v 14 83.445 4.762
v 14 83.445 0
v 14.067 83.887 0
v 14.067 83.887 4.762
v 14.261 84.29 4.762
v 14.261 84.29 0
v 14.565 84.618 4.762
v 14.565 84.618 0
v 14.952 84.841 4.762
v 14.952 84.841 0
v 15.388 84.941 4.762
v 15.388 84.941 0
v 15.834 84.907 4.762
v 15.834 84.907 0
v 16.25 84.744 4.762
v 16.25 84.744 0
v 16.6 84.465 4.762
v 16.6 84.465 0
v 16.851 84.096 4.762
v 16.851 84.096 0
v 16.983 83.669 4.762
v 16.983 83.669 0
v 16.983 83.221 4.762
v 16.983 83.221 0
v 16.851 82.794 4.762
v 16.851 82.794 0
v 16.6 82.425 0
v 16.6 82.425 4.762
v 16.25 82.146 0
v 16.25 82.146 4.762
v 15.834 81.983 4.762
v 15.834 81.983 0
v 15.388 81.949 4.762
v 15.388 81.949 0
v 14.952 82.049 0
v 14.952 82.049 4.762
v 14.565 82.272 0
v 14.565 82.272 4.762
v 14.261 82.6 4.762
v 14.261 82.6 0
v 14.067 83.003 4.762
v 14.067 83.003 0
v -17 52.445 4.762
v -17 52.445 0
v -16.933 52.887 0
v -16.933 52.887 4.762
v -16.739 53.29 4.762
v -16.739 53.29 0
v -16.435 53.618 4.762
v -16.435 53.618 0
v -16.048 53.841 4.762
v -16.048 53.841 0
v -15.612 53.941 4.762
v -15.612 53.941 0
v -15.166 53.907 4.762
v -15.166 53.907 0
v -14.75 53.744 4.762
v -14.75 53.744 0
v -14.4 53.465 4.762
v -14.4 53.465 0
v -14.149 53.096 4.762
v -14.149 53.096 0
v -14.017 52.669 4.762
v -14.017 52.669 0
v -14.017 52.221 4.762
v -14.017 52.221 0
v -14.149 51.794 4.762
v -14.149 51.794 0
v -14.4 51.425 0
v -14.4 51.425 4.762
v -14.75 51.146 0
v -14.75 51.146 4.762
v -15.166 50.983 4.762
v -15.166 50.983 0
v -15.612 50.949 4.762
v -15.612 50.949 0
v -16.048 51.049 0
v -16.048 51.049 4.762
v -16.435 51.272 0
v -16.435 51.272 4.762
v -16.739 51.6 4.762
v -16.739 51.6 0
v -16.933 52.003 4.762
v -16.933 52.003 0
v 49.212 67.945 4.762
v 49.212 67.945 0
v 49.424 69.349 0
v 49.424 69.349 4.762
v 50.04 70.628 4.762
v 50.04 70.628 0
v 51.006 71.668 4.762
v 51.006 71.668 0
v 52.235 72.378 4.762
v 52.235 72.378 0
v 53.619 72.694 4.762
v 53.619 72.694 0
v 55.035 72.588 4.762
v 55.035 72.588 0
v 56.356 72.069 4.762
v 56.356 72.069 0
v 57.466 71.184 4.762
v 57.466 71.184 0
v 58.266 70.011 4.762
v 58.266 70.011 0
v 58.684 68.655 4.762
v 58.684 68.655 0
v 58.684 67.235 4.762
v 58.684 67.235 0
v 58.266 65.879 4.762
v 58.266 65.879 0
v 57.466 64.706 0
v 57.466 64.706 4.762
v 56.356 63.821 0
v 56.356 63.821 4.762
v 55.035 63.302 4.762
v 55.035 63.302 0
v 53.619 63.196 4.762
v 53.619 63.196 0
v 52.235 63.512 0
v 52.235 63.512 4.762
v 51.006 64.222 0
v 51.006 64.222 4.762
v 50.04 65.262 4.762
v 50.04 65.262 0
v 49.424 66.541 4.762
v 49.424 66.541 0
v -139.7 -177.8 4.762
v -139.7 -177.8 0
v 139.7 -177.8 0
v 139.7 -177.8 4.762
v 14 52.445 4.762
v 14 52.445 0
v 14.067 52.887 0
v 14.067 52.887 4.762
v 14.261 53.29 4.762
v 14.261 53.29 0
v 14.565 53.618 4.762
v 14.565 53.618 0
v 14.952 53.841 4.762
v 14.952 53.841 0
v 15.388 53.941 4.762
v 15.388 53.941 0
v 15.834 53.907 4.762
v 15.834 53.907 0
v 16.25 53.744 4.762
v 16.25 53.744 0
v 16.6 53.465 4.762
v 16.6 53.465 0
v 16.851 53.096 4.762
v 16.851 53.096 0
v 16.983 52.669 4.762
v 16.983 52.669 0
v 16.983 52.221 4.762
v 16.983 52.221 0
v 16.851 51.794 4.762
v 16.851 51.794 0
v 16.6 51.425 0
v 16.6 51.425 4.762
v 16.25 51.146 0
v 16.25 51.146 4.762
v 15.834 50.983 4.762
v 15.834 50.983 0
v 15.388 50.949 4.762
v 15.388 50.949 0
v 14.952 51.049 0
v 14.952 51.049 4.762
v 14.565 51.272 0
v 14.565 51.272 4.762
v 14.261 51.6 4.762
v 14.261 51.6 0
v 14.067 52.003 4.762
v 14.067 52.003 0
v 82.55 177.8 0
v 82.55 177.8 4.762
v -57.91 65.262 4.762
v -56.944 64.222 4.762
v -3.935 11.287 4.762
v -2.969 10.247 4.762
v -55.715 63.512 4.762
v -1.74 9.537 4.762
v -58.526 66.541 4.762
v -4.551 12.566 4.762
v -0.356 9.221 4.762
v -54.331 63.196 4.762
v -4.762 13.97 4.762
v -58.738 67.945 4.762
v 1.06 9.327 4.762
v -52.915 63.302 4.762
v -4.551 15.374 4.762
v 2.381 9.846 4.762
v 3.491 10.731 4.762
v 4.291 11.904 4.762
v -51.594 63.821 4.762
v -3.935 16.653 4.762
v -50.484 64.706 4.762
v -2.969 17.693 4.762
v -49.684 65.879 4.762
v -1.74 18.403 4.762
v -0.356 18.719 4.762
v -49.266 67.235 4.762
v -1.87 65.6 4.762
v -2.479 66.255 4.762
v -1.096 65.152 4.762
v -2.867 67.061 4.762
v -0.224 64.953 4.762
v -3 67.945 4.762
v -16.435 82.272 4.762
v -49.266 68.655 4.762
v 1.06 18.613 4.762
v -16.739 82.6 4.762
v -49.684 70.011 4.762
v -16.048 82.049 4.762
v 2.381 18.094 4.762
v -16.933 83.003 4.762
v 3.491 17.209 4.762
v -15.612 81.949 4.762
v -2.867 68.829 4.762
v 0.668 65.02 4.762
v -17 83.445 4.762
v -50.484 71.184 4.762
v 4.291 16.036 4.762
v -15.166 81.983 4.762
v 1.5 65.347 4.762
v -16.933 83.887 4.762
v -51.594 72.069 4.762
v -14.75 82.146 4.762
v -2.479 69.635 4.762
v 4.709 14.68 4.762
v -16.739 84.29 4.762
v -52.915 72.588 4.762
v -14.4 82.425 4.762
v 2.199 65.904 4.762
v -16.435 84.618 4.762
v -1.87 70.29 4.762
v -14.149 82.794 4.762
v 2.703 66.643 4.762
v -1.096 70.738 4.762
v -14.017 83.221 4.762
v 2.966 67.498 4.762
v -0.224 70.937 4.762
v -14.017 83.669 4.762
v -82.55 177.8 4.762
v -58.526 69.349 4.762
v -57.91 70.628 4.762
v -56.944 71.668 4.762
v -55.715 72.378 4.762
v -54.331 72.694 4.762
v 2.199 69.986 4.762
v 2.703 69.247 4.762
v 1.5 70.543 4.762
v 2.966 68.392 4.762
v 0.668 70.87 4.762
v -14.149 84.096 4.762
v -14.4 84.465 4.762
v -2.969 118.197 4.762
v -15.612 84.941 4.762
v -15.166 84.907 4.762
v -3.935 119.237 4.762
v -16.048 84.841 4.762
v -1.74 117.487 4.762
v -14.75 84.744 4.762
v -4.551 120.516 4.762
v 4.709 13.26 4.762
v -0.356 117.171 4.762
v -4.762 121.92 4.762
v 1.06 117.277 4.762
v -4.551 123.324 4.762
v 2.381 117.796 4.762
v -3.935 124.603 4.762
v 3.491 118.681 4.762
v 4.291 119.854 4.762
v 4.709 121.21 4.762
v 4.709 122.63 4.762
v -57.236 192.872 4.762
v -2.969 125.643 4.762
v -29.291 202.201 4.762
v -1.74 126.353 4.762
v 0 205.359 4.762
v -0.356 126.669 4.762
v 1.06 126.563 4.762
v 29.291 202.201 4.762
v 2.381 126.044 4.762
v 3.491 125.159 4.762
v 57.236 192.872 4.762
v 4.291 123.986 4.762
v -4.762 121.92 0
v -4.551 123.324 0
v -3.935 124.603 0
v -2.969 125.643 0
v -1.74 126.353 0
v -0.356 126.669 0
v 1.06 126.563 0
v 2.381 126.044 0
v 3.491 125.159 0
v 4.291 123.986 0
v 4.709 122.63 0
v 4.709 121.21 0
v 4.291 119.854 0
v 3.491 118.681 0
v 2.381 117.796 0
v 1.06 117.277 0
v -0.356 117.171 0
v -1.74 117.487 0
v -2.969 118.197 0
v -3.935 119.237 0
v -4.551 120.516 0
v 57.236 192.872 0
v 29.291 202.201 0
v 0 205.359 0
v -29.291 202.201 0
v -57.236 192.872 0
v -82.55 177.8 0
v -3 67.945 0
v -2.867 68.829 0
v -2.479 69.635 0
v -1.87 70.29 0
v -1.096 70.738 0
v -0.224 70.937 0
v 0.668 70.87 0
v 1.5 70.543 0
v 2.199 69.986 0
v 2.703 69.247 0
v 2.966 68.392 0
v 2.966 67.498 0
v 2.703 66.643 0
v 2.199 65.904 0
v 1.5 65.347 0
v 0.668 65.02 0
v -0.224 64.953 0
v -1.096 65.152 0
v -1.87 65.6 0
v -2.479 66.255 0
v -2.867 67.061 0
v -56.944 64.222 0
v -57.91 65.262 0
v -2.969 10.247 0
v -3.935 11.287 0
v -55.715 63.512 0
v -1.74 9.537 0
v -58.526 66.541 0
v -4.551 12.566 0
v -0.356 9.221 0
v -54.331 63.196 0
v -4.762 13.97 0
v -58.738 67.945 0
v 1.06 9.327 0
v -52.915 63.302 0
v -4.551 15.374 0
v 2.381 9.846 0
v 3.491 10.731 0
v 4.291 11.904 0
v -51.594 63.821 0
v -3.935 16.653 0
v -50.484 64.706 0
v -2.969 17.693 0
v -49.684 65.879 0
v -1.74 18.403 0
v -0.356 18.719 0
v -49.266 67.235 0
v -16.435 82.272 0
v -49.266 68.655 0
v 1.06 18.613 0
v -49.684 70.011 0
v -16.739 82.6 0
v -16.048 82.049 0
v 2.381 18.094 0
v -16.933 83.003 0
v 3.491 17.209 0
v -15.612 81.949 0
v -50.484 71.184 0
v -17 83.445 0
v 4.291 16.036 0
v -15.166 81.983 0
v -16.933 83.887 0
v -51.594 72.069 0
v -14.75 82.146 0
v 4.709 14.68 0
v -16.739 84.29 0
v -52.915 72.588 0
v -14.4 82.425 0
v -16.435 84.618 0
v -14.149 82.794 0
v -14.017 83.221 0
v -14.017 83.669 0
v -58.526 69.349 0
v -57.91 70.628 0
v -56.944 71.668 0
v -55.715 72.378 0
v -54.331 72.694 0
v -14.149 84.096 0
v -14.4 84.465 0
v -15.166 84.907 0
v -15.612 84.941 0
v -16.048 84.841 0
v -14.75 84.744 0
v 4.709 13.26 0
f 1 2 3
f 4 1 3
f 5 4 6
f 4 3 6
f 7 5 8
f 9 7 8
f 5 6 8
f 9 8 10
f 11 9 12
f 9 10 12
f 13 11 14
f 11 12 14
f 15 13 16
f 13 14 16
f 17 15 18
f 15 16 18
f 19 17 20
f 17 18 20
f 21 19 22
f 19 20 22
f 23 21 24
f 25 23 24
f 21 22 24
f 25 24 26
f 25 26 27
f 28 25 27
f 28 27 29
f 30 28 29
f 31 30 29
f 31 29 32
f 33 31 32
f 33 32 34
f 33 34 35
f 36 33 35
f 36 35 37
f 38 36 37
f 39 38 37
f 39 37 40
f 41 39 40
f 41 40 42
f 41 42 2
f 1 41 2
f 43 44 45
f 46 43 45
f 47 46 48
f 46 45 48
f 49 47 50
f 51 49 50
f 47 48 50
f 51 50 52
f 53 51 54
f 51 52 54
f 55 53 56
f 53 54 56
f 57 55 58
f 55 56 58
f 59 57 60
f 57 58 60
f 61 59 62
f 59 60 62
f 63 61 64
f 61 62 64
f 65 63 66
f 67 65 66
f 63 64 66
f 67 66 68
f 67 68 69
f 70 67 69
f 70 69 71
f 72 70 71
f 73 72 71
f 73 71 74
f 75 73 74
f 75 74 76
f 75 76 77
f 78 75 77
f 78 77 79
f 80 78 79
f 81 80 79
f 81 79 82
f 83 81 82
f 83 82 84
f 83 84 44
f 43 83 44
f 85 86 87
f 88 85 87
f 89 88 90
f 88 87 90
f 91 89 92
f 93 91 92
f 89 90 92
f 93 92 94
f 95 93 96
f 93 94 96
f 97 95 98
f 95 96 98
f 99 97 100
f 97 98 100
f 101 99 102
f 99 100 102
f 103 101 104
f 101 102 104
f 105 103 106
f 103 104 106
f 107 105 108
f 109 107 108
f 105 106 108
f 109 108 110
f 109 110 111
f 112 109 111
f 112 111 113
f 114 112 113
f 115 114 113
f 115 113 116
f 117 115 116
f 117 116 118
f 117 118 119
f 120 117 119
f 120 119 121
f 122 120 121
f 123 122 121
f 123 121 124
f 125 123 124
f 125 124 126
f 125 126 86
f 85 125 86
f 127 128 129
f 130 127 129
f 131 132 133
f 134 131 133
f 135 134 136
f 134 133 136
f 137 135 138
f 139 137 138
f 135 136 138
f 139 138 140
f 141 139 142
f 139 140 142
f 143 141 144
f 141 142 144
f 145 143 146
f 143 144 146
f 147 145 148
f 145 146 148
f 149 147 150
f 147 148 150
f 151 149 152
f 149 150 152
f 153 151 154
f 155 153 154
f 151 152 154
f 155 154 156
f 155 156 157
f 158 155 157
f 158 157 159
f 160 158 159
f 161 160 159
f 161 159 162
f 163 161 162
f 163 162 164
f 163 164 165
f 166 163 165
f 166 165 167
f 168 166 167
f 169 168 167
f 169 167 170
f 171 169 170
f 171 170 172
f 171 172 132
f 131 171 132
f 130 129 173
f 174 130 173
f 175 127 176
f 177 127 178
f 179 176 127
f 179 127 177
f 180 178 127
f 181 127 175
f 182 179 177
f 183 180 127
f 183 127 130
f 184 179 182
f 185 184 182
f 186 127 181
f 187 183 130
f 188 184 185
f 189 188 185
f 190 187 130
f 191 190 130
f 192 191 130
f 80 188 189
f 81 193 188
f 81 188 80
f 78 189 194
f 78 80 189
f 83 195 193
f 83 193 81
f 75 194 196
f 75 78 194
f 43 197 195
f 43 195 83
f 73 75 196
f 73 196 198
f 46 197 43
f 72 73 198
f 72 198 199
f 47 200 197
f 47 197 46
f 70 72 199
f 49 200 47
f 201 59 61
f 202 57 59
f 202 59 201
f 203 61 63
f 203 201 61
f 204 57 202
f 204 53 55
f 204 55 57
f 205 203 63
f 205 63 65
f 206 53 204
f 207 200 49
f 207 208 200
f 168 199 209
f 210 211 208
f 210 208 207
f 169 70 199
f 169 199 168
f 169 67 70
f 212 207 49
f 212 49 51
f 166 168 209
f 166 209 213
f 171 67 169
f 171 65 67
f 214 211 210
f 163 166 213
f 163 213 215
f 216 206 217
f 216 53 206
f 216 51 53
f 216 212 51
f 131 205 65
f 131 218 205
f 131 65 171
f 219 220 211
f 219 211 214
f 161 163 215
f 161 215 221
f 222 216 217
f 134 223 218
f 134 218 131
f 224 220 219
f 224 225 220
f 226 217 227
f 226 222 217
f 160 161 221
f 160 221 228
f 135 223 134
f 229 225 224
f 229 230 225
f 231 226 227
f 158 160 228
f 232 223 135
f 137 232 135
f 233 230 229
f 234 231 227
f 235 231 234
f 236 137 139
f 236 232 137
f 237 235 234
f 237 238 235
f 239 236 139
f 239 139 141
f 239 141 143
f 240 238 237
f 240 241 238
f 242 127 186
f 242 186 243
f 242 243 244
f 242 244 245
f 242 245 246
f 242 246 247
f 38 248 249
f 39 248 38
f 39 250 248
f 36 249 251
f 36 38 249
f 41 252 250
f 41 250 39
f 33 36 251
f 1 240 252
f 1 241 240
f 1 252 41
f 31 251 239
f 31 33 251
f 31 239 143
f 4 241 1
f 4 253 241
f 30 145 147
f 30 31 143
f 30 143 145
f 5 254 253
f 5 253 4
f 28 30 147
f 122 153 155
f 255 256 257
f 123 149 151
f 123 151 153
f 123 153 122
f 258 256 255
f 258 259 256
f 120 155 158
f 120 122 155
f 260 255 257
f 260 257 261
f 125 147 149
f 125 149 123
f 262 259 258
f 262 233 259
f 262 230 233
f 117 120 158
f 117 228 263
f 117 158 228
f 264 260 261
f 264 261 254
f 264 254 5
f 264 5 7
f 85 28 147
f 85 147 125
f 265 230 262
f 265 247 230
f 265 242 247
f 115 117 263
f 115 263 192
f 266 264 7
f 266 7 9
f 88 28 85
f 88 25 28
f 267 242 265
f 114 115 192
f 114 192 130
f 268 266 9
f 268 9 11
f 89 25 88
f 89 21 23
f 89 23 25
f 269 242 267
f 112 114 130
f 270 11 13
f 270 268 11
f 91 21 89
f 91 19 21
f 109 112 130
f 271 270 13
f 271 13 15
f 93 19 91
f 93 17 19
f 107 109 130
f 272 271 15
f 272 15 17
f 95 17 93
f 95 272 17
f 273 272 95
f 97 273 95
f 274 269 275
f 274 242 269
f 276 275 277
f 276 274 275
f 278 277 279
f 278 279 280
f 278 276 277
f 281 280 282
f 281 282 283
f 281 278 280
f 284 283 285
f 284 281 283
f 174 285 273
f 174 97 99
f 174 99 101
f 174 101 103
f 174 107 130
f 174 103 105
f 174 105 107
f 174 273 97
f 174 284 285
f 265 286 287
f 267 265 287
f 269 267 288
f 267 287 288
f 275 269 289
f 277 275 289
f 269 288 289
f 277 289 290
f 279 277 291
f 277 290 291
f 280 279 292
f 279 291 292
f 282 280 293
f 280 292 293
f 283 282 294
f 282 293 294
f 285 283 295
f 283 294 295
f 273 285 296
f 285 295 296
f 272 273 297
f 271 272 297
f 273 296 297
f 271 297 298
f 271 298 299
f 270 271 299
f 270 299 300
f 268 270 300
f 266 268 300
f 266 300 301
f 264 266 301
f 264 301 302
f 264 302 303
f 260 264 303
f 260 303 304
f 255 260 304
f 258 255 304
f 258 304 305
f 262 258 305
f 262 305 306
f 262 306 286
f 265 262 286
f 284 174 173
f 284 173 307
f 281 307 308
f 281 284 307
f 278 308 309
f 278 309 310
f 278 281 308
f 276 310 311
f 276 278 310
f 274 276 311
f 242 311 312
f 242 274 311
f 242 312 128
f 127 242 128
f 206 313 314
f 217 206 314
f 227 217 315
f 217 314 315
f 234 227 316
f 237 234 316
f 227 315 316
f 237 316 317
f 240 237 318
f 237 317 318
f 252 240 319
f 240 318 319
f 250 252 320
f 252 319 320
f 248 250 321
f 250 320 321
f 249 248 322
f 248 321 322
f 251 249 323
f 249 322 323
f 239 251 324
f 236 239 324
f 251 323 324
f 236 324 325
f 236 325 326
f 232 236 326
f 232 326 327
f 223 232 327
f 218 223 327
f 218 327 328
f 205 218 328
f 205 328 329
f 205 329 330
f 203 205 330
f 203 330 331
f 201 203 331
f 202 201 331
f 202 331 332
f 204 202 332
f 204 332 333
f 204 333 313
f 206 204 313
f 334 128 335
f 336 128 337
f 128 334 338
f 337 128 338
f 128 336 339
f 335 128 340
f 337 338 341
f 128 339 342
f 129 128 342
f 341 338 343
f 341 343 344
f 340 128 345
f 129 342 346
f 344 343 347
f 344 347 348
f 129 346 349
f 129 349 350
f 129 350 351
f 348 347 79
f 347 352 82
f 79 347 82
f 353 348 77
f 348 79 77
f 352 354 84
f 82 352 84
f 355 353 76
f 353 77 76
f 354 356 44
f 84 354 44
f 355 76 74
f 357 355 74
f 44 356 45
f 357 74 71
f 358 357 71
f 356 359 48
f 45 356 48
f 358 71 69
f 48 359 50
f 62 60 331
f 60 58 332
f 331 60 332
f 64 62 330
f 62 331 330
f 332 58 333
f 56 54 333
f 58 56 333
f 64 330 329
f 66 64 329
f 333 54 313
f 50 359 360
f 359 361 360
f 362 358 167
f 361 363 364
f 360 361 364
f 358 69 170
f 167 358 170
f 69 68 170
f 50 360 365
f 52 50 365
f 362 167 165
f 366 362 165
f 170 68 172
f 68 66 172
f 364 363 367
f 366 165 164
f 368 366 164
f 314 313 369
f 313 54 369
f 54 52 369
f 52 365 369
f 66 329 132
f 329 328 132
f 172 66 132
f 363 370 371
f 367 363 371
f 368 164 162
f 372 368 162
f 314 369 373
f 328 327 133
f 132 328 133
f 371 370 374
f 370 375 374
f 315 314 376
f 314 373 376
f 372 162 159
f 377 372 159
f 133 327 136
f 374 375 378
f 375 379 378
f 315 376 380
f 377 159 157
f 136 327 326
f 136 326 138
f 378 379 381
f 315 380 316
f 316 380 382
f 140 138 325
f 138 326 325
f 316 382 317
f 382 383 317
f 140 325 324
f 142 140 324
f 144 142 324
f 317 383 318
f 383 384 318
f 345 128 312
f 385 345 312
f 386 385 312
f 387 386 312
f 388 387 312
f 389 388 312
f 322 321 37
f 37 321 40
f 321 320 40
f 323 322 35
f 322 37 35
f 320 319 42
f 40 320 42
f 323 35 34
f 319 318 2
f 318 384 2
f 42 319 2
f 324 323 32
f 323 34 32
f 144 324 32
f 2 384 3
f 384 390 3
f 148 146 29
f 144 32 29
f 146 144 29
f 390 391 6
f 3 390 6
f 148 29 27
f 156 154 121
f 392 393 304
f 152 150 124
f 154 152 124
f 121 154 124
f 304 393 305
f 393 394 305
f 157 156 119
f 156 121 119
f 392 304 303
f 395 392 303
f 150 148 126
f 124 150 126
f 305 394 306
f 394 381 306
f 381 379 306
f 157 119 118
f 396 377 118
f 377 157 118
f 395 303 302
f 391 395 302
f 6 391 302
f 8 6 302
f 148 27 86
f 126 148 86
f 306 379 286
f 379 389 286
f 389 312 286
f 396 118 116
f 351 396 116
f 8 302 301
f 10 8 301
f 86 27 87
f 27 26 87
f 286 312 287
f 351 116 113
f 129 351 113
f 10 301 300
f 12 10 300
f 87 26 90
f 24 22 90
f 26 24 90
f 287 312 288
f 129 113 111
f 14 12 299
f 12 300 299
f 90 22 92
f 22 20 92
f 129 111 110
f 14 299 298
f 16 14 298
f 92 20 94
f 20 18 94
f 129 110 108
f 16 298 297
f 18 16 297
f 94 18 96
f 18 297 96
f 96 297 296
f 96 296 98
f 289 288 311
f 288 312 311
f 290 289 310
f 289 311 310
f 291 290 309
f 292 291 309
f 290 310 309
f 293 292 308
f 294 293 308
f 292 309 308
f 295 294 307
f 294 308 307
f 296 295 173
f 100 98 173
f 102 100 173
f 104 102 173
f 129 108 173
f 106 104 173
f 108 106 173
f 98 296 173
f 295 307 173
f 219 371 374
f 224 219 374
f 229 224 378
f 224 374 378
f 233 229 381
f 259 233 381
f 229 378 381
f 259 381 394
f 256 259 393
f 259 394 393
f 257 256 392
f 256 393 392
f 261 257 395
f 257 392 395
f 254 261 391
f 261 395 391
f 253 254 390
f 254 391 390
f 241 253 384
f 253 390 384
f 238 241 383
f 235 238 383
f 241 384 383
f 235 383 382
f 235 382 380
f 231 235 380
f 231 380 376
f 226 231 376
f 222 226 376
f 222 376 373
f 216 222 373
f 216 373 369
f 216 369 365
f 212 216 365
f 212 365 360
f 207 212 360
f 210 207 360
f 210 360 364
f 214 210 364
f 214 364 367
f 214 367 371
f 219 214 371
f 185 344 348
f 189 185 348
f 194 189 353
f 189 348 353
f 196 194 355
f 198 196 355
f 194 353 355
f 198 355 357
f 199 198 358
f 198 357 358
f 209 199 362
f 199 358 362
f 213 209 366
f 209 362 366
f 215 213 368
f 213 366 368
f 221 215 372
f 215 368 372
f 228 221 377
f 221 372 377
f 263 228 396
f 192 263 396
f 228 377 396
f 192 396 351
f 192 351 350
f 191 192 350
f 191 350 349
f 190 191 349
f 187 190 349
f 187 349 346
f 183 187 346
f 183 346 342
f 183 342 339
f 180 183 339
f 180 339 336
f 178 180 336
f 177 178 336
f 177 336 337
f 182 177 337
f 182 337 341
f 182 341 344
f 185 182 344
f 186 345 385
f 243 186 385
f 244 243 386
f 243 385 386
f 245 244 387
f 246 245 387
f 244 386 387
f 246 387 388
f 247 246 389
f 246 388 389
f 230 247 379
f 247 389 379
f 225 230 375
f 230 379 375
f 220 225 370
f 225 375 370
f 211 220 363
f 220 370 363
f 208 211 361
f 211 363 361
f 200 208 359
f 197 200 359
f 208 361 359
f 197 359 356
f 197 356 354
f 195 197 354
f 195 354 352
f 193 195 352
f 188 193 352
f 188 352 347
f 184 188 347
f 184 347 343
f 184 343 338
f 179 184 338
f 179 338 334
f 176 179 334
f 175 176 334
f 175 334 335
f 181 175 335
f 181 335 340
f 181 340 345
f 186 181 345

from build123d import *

# Parameters (mm, degrees)
F0_W     = 82.55
F0_H     = 355.6
F1_DEPTH = 4.7625
F3_D     = 9.525
F4_D     = 3
F5_D     = 6
F7_DEPTH = 4.7625


with BuildPart() as f1:
    # F0 (on Top) → F1 (new body)
    with BuildSketch(Plane.XY):
        with Locations((41.275, 0)):
            Rectangle(F0_W, F0_H)
        Polygon((82.55, 177.8), (82.55, -177.8), (139.7, -177.8), align=None)
        with Locations((-41.275, 0)):
            Rectangle(F0_W, F0_H)
        Polygon((-139.7, -177.8), (-82.55, -177.8), (-82.55, 177.8), align=None)
    extrude(amount=F1_DEPTH)

    # F3 (through all)
    with Locations(Plane.XY.offset(4.7625)):
        with Locations((-53.975, 67.945), (0, 121.92), (53.975, 67.945), (0, 13.97)):
            Hole(F3_D / 2)

    # F4 (through all)
    with Locations(Plane.XY.offset(4.7625)):
        with Locations((15.5, 83.445), (-15.5, 83.445), (-15.5, 52.445), (15.5, 52.445)):
            Hole(F4_D / 2)

    # F5 (through all)
    with Locations(Plane.XY.offset(4.7625)):
        with Locations((0, 67.945)):
            Hole(F5_D / 2)

    # F6 (on face) → F7 (join)
    with BuildSketch(Plane.XY.offset(4.7625)):
        with BuildLine():
            Line((-82.55, 177.8), (82.55, 177.8))
            ThreePointArc((82.55, 177.8), (0, 205.359059), (-82.55, 177.8))
        make_face()
    extrude(amount=-F7_DEPTH)


solid = f1.part
